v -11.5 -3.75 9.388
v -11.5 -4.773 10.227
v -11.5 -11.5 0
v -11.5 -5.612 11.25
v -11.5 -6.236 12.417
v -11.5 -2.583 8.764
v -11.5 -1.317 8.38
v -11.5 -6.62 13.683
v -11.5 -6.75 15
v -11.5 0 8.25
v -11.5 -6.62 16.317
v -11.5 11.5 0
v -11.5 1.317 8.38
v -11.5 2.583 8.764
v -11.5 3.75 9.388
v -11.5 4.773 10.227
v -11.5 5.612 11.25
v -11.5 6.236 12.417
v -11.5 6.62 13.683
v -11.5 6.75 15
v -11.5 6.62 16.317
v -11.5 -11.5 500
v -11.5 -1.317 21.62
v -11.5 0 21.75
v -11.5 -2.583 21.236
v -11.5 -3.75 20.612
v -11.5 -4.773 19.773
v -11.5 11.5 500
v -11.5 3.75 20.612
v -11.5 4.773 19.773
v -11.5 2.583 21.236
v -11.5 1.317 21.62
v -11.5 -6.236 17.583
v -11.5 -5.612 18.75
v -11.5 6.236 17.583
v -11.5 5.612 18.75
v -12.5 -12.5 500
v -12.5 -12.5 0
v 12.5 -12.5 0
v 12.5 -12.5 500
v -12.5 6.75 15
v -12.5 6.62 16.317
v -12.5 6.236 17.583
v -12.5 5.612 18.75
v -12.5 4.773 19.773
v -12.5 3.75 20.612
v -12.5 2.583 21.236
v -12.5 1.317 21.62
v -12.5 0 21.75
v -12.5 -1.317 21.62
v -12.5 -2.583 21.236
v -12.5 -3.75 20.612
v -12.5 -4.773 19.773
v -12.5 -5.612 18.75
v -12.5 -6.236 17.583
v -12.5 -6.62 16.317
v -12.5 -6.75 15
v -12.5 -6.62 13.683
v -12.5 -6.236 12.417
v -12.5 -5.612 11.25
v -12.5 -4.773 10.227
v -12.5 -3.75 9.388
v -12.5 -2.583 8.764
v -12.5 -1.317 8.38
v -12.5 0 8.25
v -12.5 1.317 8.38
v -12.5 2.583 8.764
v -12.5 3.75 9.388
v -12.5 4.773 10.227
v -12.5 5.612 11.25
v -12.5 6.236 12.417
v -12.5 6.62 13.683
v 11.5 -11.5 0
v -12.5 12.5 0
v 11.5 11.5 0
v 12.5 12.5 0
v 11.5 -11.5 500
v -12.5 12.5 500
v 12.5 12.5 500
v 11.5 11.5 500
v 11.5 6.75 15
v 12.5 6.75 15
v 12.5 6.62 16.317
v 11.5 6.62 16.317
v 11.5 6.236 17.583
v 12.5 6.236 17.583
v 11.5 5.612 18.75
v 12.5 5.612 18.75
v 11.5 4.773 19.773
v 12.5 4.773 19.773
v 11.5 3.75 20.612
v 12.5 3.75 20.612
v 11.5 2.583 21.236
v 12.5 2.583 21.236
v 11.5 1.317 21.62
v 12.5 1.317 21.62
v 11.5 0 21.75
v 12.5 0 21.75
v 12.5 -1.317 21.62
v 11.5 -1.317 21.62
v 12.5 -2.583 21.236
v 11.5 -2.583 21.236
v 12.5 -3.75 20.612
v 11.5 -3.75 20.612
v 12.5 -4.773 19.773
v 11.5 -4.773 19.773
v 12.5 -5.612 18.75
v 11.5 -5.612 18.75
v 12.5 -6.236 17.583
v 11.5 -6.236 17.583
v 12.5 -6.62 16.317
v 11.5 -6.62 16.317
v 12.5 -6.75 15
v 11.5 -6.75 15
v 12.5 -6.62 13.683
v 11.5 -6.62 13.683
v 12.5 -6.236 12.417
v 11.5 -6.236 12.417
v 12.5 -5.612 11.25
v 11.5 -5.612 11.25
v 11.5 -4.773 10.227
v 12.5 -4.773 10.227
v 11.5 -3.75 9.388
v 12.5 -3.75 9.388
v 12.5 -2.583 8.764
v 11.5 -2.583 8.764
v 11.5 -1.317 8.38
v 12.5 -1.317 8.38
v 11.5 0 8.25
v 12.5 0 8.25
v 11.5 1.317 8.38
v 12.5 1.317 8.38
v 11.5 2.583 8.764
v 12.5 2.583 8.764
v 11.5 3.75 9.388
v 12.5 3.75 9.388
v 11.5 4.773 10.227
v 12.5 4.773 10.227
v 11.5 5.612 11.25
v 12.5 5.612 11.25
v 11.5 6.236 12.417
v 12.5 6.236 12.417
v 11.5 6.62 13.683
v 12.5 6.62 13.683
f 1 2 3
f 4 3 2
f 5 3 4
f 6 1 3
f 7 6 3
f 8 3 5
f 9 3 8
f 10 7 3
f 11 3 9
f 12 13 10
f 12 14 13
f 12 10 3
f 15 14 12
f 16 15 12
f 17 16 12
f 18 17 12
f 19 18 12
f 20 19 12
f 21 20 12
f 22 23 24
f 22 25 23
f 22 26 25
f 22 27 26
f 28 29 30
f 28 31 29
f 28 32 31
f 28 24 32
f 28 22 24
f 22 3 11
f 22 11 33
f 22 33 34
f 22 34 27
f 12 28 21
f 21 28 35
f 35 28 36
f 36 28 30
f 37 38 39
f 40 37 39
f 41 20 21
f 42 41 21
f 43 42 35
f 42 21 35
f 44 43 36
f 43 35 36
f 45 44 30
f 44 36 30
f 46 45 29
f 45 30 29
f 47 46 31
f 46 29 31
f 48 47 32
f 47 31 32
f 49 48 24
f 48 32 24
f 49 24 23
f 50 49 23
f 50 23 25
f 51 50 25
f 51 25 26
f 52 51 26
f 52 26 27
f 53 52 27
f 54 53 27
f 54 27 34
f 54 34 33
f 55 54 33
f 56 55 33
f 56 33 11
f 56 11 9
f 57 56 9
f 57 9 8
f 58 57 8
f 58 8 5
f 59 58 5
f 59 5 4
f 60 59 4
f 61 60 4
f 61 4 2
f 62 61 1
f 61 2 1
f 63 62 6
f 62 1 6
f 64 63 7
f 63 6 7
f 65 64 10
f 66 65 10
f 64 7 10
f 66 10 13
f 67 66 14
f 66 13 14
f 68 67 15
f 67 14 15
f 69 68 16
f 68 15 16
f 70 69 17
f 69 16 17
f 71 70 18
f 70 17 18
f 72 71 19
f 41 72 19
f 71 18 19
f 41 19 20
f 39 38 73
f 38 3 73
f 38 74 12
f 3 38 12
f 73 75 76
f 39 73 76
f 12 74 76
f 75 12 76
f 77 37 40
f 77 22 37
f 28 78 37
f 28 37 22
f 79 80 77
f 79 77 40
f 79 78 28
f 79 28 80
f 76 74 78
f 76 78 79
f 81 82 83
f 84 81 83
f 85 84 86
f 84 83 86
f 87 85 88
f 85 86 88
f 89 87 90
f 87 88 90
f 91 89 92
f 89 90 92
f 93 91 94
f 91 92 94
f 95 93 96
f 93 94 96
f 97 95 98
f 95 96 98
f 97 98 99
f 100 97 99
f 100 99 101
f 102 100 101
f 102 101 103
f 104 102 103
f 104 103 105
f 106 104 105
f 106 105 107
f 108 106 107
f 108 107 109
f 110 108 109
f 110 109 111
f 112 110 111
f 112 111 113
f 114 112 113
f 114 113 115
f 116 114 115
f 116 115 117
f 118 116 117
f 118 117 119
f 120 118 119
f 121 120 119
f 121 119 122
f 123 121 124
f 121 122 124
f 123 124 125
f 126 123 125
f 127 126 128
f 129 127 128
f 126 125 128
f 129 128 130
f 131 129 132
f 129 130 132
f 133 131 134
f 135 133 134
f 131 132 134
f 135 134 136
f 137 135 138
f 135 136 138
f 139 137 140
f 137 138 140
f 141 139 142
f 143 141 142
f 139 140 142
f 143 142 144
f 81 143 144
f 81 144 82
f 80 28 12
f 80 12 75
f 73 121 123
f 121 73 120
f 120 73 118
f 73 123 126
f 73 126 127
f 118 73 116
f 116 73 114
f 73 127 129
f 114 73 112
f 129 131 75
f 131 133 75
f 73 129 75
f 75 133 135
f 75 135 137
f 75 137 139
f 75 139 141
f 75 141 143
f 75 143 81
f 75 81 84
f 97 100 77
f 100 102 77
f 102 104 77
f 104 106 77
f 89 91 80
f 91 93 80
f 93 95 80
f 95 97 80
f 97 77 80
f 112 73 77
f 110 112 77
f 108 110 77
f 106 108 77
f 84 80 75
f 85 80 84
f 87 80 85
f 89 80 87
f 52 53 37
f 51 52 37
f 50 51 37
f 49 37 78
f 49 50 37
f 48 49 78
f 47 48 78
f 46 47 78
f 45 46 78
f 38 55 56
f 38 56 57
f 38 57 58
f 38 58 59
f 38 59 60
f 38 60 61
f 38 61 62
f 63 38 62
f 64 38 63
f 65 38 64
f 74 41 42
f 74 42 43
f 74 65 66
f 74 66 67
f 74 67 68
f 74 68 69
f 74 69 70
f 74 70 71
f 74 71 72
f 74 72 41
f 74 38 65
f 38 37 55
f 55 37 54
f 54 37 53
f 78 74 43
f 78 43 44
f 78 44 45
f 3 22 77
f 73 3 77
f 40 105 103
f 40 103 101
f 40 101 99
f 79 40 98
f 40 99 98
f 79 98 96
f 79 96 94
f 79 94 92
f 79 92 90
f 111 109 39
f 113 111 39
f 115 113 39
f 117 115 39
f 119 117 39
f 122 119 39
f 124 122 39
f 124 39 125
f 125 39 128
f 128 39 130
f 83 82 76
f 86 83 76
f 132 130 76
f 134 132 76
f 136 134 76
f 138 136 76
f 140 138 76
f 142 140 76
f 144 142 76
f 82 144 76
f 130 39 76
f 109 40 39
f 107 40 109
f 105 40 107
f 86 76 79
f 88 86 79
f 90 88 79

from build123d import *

# Parameters (mm, degrees)
SKETCH1_W           = 25
SKETCH1_H           = 25
BOSS_EXTRUDE1_DEPTH = 500
SKETCH2_W           = 23
SKETCH2_H           = 23
CUT_EXTRUDE1_DEPTH  = 501.312402405
SKETCH3_R           = 6.75
CUT_EXTRUDE2_DEPTH  = 501.7806406


with BuildPart() as part:
    # Sketch1 → Boss-Extrude1 (new body)
    with BuildSketch(Plane.XY):
        Rectangle(SKETCH1_W, SKETCH1_H)
    extrude(amount=BOSS_EXTRUDE1_DEPTH)

    # Sketch2 → Cut-Extrude1 (cut, through all)
    with BuildSketch(Plane.XY.offset(500)):
        Rectangle(SKETCH2_W, SKETCH2_H)
    extrude(amount=-CUT_EXTRUDE1_DEPTH, mode=Mode.SUBTRACT)

    # Sketch3 → Cut-Extrude2 (cut, through all)
    with BuildSketch(Plane(origin=(12.5, 0, 0), x_dir=(0, 0, -1), z_dir=(1, 0, 0))):
        with Locations(Location((-15, 0, 0), (0, 0, 90))):
            Circle(SKETCH3_R)
    extrude(amount=-CUT_EXTRUDE2_DEPTH, mode=Mode.SUBTRACT)


solid = part.part
